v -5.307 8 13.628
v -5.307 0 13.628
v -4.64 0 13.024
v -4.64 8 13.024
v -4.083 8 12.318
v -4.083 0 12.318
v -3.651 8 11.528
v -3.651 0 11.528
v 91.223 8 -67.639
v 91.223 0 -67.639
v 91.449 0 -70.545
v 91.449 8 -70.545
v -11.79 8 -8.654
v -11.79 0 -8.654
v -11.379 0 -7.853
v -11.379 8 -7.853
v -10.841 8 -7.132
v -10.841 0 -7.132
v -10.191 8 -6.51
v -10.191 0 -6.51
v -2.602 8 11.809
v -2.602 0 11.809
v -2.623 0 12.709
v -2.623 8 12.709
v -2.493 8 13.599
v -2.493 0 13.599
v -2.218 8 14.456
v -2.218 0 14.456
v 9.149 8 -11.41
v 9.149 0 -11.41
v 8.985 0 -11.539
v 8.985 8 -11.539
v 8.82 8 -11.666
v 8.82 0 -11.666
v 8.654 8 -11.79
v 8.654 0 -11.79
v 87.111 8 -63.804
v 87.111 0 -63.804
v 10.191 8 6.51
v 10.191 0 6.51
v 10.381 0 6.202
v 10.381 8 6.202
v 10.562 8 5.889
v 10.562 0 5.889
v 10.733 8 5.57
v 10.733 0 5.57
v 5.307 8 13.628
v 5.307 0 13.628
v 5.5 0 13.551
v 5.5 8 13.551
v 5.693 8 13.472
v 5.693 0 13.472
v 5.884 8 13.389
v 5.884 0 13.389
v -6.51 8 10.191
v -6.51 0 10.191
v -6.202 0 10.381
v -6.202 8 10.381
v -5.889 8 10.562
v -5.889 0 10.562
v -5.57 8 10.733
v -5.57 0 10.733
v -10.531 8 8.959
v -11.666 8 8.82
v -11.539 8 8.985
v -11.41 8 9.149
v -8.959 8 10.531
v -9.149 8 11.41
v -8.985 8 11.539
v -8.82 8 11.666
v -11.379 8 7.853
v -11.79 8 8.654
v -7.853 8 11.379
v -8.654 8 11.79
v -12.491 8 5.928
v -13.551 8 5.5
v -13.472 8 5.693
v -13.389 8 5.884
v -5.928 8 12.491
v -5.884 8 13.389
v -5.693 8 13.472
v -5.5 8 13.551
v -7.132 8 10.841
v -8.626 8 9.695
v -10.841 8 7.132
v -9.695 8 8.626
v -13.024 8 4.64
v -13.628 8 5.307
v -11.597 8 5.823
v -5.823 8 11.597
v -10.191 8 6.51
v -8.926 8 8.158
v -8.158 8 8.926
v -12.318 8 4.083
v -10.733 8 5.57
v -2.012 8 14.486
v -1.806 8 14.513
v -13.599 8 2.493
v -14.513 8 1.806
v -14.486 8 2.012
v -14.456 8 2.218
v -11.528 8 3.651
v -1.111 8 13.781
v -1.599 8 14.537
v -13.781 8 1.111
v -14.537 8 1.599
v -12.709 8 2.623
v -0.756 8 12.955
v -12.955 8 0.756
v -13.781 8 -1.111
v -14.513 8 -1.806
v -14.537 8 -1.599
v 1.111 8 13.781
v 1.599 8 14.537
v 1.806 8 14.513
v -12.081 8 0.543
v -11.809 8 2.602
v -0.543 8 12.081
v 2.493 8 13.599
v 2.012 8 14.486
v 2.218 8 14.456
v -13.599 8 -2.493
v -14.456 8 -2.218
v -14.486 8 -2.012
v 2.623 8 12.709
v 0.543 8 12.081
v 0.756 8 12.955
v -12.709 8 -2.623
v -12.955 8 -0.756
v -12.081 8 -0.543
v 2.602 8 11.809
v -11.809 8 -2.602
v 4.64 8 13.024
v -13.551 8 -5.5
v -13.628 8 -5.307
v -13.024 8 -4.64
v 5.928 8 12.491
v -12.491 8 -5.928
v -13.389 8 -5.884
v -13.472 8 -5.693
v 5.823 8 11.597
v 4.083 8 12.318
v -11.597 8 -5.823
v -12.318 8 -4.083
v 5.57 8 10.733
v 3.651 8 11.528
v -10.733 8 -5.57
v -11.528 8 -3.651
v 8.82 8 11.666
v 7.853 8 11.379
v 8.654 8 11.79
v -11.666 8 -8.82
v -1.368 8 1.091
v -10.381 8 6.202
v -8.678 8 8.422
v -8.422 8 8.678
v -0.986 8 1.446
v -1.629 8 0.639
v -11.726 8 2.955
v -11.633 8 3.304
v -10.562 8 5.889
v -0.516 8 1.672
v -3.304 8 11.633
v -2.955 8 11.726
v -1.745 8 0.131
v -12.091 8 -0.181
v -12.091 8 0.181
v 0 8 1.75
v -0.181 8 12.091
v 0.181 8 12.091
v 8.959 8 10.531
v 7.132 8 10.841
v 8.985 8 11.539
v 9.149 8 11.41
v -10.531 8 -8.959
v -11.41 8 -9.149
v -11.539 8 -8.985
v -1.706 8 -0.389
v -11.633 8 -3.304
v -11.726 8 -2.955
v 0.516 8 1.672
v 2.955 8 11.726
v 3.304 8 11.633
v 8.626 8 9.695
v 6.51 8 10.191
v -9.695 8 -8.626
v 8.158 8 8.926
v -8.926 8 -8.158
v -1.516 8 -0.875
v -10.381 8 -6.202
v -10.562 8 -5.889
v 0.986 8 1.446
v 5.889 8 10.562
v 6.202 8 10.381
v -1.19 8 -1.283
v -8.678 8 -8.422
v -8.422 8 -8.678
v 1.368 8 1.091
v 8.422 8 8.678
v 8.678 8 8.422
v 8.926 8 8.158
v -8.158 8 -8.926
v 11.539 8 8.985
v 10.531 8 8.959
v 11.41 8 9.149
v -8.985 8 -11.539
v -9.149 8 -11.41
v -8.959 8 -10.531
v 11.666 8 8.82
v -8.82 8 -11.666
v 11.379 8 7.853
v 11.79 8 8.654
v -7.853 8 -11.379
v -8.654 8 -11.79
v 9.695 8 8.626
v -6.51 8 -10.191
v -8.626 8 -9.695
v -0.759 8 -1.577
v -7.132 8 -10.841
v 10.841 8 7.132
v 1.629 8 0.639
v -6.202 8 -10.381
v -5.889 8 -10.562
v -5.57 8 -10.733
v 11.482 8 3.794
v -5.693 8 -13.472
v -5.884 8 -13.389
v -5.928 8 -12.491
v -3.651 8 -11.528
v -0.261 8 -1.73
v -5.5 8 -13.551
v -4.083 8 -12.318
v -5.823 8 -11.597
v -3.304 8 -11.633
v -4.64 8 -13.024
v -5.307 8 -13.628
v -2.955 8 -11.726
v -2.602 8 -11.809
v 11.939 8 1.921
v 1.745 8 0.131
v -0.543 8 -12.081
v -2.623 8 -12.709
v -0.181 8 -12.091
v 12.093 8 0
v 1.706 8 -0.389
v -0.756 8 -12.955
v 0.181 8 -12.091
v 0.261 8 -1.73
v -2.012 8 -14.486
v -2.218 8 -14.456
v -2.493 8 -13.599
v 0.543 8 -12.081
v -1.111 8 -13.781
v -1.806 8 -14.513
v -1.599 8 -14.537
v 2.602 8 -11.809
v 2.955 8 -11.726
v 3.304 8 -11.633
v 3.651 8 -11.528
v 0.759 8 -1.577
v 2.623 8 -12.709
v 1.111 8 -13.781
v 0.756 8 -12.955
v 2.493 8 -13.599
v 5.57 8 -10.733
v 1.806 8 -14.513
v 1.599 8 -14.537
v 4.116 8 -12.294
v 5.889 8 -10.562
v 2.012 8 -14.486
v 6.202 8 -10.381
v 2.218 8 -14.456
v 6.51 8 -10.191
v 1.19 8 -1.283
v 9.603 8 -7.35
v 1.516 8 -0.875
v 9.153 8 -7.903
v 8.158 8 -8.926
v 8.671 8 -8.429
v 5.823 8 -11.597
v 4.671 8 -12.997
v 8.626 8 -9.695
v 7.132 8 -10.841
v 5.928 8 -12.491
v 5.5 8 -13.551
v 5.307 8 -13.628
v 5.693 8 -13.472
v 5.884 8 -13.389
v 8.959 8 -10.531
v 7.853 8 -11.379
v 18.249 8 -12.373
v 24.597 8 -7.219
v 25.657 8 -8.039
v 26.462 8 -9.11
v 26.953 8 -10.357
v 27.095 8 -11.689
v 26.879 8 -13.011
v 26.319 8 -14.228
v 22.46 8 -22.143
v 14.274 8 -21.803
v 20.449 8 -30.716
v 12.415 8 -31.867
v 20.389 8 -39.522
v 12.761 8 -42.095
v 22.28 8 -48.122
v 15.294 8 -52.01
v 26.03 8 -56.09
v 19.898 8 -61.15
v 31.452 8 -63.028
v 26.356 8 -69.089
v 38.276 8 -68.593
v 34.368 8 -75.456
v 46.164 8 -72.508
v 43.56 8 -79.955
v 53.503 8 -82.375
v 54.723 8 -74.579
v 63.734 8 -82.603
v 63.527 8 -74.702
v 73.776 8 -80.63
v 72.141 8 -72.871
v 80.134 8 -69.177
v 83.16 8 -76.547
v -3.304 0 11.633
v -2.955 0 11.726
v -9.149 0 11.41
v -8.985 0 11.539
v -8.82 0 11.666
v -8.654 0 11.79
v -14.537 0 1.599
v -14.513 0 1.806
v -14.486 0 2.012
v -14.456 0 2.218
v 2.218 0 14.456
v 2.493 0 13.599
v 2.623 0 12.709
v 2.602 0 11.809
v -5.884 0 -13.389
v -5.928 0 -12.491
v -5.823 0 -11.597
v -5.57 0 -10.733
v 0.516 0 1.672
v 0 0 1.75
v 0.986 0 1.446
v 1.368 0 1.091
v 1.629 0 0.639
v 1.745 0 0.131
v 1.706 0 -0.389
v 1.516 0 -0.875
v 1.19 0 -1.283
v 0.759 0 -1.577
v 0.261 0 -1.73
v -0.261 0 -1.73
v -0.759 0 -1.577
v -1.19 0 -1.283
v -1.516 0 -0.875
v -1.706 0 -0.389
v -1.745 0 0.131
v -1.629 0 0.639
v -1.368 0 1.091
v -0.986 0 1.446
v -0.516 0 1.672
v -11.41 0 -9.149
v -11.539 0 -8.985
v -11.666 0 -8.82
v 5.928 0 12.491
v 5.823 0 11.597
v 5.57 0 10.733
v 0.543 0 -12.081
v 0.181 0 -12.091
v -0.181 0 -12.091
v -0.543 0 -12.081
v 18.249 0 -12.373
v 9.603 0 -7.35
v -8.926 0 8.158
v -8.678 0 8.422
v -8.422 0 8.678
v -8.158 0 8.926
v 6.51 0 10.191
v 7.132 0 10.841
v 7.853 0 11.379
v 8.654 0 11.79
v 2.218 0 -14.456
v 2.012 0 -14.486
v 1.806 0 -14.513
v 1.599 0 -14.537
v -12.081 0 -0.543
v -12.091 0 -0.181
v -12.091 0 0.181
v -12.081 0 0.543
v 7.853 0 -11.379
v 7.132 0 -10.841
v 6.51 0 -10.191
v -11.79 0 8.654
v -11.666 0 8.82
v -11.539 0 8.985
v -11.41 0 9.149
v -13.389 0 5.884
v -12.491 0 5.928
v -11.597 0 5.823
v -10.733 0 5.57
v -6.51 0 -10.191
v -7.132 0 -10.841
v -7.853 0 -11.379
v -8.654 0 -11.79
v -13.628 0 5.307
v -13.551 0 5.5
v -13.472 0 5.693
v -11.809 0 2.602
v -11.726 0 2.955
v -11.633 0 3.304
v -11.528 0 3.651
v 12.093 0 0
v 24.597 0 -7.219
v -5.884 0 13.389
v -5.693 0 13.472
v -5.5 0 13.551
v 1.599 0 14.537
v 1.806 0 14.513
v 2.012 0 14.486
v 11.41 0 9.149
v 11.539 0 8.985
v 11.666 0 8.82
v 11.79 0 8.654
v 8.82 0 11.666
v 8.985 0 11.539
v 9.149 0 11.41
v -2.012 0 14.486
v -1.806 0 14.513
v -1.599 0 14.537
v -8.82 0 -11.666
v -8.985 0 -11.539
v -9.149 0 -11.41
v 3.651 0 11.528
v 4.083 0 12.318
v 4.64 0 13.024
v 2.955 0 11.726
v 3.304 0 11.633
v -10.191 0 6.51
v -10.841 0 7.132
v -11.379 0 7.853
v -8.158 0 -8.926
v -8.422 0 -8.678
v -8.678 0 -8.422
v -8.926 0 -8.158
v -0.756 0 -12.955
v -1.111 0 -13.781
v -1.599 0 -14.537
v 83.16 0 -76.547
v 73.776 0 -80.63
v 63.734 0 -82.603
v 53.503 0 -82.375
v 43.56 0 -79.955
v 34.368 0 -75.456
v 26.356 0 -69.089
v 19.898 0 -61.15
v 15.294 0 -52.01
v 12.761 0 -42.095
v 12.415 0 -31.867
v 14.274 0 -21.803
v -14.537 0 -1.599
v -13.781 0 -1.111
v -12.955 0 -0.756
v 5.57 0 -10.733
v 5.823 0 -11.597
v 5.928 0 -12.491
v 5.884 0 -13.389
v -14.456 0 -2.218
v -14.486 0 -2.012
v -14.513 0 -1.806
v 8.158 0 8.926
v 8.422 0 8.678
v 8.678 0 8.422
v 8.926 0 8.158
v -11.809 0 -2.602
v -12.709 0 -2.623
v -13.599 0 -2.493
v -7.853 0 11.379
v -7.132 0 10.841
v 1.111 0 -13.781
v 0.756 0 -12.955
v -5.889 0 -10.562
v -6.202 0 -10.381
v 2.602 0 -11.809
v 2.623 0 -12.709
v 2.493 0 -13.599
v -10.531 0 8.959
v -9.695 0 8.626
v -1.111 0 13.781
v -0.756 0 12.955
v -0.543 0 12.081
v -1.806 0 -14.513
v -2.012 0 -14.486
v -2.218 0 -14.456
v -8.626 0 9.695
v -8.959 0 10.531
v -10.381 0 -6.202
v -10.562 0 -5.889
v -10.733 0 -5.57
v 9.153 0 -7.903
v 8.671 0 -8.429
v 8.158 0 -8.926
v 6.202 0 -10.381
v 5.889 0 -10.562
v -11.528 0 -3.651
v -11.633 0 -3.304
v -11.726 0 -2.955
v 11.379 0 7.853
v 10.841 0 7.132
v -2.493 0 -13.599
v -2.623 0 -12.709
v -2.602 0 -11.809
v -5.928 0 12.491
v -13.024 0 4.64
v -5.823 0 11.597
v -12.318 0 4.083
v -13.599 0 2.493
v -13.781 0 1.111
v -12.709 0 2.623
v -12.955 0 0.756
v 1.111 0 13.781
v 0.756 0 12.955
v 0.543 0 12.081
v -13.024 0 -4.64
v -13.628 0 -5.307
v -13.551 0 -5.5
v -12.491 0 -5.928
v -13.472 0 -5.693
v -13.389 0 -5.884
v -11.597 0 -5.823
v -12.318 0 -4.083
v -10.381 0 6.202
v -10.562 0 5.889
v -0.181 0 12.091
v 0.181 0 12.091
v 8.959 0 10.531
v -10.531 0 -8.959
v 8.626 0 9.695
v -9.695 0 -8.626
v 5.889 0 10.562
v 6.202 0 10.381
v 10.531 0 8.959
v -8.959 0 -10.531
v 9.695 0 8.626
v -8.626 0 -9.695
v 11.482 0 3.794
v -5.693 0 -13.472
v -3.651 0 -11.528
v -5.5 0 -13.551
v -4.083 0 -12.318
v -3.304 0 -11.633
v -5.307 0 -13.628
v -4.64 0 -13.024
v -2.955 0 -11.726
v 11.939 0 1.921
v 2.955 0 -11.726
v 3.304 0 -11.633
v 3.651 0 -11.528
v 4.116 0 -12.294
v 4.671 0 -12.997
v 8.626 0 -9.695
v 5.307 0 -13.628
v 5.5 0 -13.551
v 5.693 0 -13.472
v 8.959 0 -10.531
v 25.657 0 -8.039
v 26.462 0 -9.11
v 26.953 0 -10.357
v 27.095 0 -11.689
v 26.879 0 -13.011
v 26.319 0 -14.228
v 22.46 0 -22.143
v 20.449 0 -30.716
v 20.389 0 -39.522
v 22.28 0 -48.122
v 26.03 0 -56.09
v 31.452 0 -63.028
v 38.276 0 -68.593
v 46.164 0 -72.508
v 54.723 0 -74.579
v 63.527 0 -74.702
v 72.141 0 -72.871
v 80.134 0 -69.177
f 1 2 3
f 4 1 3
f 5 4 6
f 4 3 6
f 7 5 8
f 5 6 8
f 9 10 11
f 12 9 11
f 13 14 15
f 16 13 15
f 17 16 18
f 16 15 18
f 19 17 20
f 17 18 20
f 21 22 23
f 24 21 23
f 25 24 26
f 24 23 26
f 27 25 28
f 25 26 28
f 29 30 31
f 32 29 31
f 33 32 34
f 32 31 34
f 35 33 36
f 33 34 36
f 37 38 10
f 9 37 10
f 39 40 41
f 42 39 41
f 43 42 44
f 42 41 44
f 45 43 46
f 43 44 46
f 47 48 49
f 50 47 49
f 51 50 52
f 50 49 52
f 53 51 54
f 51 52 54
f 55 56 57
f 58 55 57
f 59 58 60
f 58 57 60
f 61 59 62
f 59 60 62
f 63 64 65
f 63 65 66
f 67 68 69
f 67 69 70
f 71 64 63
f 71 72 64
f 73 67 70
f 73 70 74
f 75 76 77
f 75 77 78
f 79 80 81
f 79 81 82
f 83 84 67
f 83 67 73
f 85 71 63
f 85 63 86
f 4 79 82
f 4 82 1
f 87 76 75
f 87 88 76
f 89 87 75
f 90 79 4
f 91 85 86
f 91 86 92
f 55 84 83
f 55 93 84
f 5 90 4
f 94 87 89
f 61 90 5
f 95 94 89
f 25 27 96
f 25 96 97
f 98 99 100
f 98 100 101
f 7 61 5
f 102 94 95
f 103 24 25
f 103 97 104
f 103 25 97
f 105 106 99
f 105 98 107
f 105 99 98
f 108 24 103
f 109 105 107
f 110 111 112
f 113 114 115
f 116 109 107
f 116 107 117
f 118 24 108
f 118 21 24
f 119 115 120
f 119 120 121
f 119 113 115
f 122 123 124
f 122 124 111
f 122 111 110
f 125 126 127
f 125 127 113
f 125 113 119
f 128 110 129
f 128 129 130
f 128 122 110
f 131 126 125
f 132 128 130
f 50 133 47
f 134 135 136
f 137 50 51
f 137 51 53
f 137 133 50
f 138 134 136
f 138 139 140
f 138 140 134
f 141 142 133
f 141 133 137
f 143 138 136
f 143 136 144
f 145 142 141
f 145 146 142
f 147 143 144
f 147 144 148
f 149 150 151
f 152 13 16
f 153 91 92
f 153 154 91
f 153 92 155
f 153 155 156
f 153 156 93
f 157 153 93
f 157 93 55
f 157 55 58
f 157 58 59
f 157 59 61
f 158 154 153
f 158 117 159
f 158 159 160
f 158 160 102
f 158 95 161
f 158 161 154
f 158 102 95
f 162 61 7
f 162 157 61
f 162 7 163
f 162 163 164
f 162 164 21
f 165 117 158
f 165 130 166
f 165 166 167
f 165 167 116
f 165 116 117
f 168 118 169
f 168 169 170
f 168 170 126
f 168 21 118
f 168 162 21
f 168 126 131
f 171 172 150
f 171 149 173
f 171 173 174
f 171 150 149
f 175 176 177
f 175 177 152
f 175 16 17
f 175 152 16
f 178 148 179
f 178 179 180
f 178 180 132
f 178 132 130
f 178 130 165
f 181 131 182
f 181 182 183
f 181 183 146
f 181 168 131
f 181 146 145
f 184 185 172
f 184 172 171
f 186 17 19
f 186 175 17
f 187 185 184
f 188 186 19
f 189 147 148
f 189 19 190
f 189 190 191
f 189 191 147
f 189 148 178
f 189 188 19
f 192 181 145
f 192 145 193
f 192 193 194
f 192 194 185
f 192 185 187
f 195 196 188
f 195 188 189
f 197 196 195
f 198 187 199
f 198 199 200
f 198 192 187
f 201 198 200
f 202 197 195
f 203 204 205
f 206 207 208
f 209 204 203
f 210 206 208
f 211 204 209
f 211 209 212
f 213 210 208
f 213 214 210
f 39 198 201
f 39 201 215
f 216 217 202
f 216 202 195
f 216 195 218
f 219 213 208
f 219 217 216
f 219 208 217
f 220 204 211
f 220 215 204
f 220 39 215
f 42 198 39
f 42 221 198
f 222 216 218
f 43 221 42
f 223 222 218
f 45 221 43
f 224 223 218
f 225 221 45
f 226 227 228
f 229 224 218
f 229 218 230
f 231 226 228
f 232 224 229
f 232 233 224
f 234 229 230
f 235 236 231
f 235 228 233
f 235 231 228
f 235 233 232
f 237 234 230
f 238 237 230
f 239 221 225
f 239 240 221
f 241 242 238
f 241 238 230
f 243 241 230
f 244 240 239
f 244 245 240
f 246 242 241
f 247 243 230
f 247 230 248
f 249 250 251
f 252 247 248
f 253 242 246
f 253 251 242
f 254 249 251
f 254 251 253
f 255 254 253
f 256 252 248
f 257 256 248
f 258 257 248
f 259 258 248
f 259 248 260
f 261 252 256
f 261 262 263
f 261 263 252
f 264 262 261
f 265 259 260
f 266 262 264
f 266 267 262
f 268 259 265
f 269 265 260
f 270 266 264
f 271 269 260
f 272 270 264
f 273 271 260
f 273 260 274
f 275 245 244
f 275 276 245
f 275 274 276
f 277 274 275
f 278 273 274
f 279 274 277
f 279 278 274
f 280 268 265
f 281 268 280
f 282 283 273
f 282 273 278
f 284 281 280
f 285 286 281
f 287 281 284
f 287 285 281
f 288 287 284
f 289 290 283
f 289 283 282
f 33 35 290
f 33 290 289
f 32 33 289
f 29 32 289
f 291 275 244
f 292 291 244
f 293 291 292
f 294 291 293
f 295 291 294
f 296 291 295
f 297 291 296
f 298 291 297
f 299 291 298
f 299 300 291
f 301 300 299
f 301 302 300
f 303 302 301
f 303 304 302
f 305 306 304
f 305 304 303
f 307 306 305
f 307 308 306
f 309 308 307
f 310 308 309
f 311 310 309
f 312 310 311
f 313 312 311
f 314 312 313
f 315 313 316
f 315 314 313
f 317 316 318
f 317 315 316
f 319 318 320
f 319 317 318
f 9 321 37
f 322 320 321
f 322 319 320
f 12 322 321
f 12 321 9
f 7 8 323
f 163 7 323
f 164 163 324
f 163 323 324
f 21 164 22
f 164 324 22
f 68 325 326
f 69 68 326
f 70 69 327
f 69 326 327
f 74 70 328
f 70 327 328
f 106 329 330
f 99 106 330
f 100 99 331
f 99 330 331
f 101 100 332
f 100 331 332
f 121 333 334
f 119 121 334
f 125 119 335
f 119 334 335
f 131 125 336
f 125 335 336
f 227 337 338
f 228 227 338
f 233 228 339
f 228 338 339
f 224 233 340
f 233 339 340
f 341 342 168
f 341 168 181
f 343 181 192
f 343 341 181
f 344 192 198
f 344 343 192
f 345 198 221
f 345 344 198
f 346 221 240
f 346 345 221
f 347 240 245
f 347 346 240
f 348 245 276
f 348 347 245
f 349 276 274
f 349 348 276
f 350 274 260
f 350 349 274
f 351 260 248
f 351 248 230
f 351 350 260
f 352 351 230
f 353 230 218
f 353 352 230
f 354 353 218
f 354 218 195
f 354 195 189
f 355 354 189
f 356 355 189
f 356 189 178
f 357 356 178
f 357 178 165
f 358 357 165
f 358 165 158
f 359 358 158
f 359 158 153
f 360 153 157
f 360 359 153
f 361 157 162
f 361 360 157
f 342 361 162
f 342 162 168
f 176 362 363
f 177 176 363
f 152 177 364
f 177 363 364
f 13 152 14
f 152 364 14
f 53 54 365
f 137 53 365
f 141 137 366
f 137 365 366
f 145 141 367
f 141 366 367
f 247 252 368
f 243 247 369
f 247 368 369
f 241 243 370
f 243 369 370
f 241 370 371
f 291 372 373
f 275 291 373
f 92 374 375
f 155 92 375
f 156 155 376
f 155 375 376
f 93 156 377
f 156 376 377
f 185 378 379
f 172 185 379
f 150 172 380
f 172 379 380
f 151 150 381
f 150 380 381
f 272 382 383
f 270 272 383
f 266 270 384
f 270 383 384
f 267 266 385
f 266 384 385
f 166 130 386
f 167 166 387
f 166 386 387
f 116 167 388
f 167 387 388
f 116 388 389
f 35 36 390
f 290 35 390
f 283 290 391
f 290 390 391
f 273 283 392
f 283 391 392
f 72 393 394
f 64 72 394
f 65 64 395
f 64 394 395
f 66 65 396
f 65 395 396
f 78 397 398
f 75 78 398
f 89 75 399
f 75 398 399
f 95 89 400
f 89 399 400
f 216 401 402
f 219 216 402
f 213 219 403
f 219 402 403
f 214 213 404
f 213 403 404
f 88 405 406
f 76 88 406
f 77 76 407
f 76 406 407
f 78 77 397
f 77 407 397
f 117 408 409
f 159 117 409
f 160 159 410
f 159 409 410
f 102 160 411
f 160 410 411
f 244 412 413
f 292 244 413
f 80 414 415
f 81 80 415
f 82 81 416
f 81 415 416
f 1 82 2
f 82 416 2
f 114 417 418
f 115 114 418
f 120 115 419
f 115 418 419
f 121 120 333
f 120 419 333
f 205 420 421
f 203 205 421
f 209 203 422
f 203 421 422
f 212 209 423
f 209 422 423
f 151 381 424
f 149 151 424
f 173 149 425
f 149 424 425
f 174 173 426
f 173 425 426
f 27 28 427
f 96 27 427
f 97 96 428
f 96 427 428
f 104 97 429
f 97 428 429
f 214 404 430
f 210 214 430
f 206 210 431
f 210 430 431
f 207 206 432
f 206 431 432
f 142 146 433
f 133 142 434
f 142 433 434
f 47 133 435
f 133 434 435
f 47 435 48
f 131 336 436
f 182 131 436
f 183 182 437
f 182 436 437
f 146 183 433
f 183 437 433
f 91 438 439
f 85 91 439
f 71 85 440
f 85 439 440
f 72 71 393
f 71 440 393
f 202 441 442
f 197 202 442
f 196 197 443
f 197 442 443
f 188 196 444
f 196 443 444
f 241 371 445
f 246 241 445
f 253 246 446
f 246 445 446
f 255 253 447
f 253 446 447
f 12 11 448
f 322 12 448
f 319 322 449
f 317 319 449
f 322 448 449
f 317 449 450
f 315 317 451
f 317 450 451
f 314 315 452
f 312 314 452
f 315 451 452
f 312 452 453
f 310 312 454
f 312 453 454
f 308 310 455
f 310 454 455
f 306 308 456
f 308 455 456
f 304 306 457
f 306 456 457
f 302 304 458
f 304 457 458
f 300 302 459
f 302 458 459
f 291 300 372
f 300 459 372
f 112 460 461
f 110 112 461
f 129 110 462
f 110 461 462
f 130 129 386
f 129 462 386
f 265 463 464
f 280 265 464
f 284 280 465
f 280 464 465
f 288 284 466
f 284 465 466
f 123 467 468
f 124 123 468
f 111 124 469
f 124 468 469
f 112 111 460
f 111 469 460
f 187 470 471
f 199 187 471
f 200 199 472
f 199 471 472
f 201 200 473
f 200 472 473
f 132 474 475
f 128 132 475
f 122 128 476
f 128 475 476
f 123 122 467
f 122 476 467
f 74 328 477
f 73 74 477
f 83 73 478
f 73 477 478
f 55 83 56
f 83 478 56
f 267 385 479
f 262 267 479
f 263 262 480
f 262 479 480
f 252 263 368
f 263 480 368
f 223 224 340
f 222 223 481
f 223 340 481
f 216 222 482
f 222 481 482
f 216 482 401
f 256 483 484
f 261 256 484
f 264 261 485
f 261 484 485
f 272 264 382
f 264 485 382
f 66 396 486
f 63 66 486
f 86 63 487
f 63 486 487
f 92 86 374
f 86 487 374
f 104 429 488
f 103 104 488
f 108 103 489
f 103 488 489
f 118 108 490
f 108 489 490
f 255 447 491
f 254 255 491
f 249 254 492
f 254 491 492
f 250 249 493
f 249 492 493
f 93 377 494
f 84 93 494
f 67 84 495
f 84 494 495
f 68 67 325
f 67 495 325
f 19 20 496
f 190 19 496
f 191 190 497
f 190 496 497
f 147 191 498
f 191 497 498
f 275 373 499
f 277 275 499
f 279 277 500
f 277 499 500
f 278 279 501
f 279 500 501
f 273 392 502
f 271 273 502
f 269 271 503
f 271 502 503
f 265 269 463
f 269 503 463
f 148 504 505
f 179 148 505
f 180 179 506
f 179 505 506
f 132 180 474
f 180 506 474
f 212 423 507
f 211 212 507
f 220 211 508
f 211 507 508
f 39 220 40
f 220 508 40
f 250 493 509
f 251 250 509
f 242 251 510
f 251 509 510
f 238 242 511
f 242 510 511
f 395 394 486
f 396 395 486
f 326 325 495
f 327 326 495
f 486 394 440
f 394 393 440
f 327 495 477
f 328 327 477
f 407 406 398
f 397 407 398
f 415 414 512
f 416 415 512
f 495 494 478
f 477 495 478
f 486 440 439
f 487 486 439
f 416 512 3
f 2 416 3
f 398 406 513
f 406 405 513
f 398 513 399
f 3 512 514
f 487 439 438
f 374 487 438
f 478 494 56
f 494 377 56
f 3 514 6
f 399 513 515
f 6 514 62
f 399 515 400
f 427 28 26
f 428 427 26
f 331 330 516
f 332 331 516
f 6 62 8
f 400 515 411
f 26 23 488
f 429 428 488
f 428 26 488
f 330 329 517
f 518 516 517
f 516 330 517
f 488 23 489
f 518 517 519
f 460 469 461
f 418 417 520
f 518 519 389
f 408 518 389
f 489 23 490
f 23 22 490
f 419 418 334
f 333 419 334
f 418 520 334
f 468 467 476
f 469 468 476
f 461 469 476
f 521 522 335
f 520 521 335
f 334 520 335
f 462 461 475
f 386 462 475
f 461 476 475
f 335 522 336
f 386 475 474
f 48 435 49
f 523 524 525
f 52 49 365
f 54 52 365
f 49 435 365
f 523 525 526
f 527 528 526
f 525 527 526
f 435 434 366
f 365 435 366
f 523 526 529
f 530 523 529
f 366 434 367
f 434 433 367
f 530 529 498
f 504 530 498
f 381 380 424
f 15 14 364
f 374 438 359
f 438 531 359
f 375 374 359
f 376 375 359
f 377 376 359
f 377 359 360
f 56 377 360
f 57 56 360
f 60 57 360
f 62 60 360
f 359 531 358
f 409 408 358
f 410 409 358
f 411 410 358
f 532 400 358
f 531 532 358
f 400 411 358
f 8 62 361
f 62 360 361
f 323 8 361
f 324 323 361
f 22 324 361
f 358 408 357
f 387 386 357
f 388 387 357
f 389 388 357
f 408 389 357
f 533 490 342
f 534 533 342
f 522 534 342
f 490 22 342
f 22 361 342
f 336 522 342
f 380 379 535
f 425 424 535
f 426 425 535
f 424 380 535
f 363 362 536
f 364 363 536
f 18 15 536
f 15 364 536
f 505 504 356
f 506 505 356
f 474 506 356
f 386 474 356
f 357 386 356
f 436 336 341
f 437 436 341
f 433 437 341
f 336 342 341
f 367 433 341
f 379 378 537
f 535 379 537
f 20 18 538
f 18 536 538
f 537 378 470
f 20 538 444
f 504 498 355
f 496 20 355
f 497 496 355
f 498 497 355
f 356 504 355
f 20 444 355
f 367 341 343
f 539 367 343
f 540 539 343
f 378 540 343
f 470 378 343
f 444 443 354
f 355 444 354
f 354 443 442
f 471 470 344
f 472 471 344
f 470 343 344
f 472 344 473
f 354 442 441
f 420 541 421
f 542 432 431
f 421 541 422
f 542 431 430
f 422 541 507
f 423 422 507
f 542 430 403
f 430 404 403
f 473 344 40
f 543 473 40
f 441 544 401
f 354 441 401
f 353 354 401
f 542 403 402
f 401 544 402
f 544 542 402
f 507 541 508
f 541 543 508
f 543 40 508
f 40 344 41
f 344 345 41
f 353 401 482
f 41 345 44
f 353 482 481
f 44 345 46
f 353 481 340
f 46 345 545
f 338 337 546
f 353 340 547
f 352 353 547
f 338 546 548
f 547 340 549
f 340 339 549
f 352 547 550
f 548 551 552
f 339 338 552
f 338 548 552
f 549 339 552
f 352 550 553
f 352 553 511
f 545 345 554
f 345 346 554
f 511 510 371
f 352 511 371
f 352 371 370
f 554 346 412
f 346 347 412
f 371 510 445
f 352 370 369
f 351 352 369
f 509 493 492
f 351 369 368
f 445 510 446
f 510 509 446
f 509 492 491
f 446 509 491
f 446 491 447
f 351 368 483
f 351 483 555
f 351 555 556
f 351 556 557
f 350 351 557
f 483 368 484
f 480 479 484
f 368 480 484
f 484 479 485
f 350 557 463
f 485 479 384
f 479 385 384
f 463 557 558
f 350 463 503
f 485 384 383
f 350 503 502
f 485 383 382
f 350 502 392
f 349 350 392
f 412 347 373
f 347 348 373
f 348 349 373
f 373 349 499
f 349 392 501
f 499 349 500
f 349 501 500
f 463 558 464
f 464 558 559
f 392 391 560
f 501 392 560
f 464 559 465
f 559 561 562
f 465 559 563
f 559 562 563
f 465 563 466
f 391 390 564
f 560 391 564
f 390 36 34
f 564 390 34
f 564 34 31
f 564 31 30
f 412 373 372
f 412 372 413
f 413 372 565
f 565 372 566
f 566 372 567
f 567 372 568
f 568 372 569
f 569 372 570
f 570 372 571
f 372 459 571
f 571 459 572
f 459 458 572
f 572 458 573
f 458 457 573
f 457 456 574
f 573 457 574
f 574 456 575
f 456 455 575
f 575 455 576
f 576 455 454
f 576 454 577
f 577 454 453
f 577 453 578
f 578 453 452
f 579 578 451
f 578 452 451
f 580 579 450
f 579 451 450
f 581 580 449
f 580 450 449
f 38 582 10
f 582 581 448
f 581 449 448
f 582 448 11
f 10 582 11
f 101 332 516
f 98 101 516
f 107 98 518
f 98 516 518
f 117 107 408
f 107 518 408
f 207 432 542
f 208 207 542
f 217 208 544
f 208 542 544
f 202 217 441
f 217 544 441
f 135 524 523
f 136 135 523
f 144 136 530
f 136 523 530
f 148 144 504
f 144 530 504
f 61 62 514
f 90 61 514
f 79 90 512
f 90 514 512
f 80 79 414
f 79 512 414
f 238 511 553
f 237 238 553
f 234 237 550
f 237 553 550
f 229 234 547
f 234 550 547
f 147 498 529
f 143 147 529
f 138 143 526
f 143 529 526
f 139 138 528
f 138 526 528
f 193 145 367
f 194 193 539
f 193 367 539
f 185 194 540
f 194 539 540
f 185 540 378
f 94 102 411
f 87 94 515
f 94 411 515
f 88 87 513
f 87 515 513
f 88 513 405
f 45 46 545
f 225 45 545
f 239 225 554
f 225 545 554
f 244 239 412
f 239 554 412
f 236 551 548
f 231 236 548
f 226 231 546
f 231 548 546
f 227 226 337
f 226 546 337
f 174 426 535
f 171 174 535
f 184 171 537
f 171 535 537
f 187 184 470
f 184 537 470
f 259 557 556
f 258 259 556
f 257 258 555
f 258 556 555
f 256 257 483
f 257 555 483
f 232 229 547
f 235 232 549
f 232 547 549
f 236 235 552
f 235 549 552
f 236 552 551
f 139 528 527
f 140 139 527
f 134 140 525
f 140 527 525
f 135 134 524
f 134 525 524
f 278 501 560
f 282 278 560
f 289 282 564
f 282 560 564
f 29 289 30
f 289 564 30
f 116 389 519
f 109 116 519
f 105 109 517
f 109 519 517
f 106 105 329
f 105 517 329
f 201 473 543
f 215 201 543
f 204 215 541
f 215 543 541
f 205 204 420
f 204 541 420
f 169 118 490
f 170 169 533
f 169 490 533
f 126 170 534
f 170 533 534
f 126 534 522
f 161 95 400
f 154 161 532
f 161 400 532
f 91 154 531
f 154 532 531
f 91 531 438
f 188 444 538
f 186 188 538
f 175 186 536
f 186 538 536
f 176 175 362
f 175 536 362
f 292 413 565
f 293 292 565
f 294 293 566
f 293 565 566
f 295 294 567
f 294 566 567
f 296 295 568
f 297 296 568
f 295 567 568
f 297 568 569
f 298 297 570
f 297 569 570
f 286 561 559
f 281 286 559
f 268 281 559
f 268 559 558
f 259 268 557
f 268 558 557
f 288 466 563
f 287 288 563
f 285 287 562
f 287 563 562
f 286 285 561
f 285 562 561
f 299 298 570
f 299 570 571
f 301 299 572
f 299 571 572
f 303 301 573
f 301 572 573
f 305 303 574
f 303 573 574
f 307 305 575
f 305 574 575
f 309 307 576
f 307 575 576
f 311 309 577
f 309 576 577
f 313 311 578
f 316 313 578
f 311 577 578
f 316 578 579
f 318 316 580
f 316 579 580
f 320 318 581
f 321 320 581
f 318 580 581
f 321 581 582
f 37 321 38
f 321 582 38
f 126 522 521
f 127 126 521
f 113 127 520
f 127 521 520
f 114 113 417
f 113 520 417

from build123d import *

# Parameters (mm, degrees)
CROQUIS1_R              = 1.75
SALIENTE_EXTRUIR1_DEPTH = 8


with BuildPart() as part:
    # Croquis1 → Saliente-Extruir1 (new body)
    with BuildSketch(Plane(origin=(0, 0, 0), x_dir=(1, 0, 0), z_dir=(0, 1, 0))):
        with BuildLine():
            ThreePointArc((26.318983455, 14.228225469), (34.708358258, 66.001642936), (87.111019212, 63.804032696))
            Line((87.111019212, 63.804032696), (91.223264764, 67.638763711))
            Line((91.223264764, 67.638763711), (91.448573923, 70.544764206))
            ThreePointArc((91.448573923, 70.544764206), (30.189185372, 72.489467715), (18.249404228, 12.373445028))
            Line((18.249404228, 12.373445028), (9.60277667, 7.349917196))
            ThreePointArc((9.60277667, 7.349917196), (8.915528014, 8.169942644), (8.158486898, 8.926012217))
            ThreePointArc((8.158486898, 8.926012217), (8.809805691, 10.105820521), (9.148703928, 11.410163953))
            ThreePointArc((9.148703928, 11.410163953), (8.903135899, 11.602792602), (8.65351323, 11.79013714))
            ThreePointArc((8.65351323, 11.79013714), (7.48132754, 11.125197659), (6.510293938, 10.190715157))
            ThreePointArc((6.510293938, 10.190715157), (6.046375, 10.472628702), (5.57027124, 10.733437515))
            ThreePointArc((5.57027124, 10.733437515), (5.894040025, 12.041618533), (5.883801663, 13.389230859))
            ThreePointArc((5.883801663, 13.389230859), (5.596745198, 13.511738163), (5.30713988, 13.62809199))
            ThreePointArc((5.30713988, 13.62809199), (4.382711316, 12.654251603), (3.650909885, 11.528463019))
            ThreePointArc((3.650909885, 11.528463019), (3.129834008, 11.680699536), (2.602450802, 11.809396783))
            ThreePointArc((2.602450802, 11.809396783), (2.576605271, 13.156800143), (2.217928037, 14.455843809))
            ThreePointArc((2.217928037, 14.455843809), (1.908945561, 14.499881098), (1.599093719, 14.537314892))
            ThreePointArc((1.599093719, 14.537314892), (0.916420874, 13.375367565), (0.542722358, 12.080565177))
            ThreePointArc((0.542722358, 12.080565177), (0, 12.09275), (-0.542722358, 12.080565177))
            ThreePointArc((-0.542722358, 12.080565177), (-0.916420874, 13.375367565), (-1.599093719, 14.537314892))
            ThreePointArc((-1.599093719, 14.537314892), (-1.908945561, 14.499881098), (-2.217928037, 14.455843809))
            ThreePointArc((-2.217928037, 14.455843809), (-2.576605271, 13.156800143), (-2.602450802, 11.809396783))
            ThreePointArc((-2.602450802, 11.809396783), (-3.129834008, 11.680699536), (-3.650909885, 11.528463019))
            ThreePointArc((-3.650909885, 11.528463019), (-4.346994451, 12.682425791), (-5.30713988, 13.62809199))
            ThreePointArc((-5.30713988, 13.62809199), (-5.596745198, 13.511738163), (-5.883801663, 13.389230859))
            ThreePointArc((-5.883801663, 13.389230859), (-5.894040025, 12.041618533), (-5.57027124, 10.733437515))
            ThreePointArc((-5.57027124, 10.733437515), (-6.046375, 10.472628702), (-6.510293938, 10.190715157))
            ThreePointArc((-6.510293938, 10.190715157), (-7.48132754, 11.125197659), (-8.65351323, 11.79013714))
            ThreePointArc((-8.65351323, 11.79013714), (-8.903135899, 11.602792602), (-9.148703928, 11.410163953))
            ThreePointArc((-9.148703928, 11.410163953), (-8.809805691, 10.105820521), (-8.158486898, 8.926012217))
            ThreePointArc((-8.158486898, 8.926012217), (-8.550865528, 8.550865528), (-8.926012217, 8.158486898))
            ThreePointArc((-8.926012217, 8.158486898), (-10.105820521, 8.809805691), (-11.410163953, 9.148703928))
            ThreePointArc((-11.410163953, 9.148703928), (-11.602792602, 8.903135899), (-11.79013714, 8.65351323))
            ThreePointArc((-11.79013714, 8.65351323), (-11.125197659, 7.48132754), (-10.190715157, 6.510293938))
            ThreePointArc((-10.190715157, 6.510293938), (-10.472628702, 6.046375), (-10.733437515, 5.57027124))
            ThreePointArc((-10.733437515, 5.57027124), (-12.041618533, 5.894040025), (-13.389230859, 5.883801663))
            ThreePointArc((-13.389230859, 5.883801663), (-13.511738163, 5.596745198), (-13.62809199, 5.30713988))
            ThreePointArc((-13.62809199, 5.30713988), (-12.682425791, 4.346994451), (-11.528463019, 3.650909885))
            ThreePointArc((-11.528463019, 3.650909885), (-11.680699536, 3.129834008), (-11.809396783, 2.602450802))
            ThreePointArc((-11.809396783, 2.602450802), (-13.156800143, 2.576605271), (-14.455843809, 2.217928037))
            ThreePointArc((-14.455843809, 2.217928037), (-14.499881098, 1.908945561), (-14.537314892, 1.599093719))
            ThreePointArc((-14.537314892, 1.599093719), (-13.375367565, 0.916420874), (-12.080565177, 0.542722358))
            ThreePointArc((-12.080565177, 0.542722358), (-12.09275, 0), (-12.080565177, -0.542722358))
            ThreePointArc((-12.080565177, -0.542722358), (-13.375367565, -0.916420874), (-14.537314892, -1.599093719))
            ThreePointArc((-14.537314892, -1.599093719), (-14.499881098, -1.908945561), (-14.455843809, -2.217928037))
            ThreePointArc((-14.455843809, -2.217928037), (-13.156800143, -2.576605271), (-11.809396783, -2.602450802))
            ThreePointArc((-11.809396783, -2.602450802), (-11.680699536, -3.129834008), (-11.528463019, -3.650909885))
            ThreePointArc((-11.528463019, -3.650909885), (-12.682425791, -4.346994451), (-13.62809199, -5.30713988))
            ThreePointArc((-13.62809199, -5.30713988), (-13.511738163, -5.596745198), (-13.389230859, -5.883801663))
            ThreePointArc((-13.389230859, -5.883801663), (-12.041618533, -5.894040025), (-10.733437515, -5.57027124))
            ThreePointArc((-10.733437515, -5.57027124), (-10.472628702, -6.046375), (-10.190715157, -6.510293938))
            ThreePointArc((-10.190715157, -6.510293938), (-11.125197659, -7.48132754), (-11.79013714, -8.65351323))
            ThreePointArc((-11.79013714, -8.65351323), (-11.602792602, -8.903135899), (-11.410163953, -9.148703928))
            ThreePointArc((-11.410163953, -9.148703928), (-10.105820521, -8.809805691), (-8.926012217, -8.158486898))
            ThreePointArc((-8.926012217, -8.158486898), (-8.550865528, -8.550865528), (-8.158486898, -8.926012217))
            ThreePointArc((-8.158486898, -8.926012217), (-8.809805691, -10.105820521), (-9.148703928, -11.410163953))
            ThreePointArc((-9.148703928, -11.410163953), (-8.903135899, -11.602792602), (-8.65351323, -11.79013714))
            ThreePointArc((-8.65351323, -11.79013714), (-7.48132754, -11.125197659), (-6.510293938, -10.190715157))
            ThreePointArc((-6.510293938, -10.190715157), (-6.046375, -10.472628702), (-5.57027124, -10.733437515))
            ThreePointArc((-5.57027124, -10.733437515), (-5.894040025, -12.041618533), (-5.883801663, -13.389230859))
            ThreePointArc((-5.883801663, -13.389230859), (-5.596745198, -13.511738163), (-5.30713988, -13.62809199))
            ThreePointArc((-5.30713988, -13.62809199), (-4.346994451, -12.682425791), (-3.650909885, -11.528463019))
            ThreePointArc((-3.650909885, -11.528463019), (-3.129834008, -11.680699536), (-2.602450802, -11.809396783))
            ThreePointArc((-2.602450802, -11.809396783), (-2.576605271, -13.156800143), (-2.217928037, -14.455843809))
            ThreePointArc((-2.217928037, -14.455843809), (-1.908945561, -14.499881098), (-1.599093719, -14.537314892))
            ThreePointArc((-1.599093719, -14.537314892), (-0.916420874, -13.375367565), (-0.542722358, -12.080565177))
            ThreePointArc((-0.542722358, -12.080565177), (0, -12.09275), (0.542722358, -12.080565177))
            ThreePointArc((0.542722358, -12.080565177), (0.916420874, -13.375367565), (1.599093719, -14.537314892))
            ThreePointArc((1.599093719, -14.537314892), (1.908945561, -14.499881098), (2.217928037, -14.455843809))
            ThreePointArc((2.217928037, -14.455843809), (2.576605271, -13.156800143), (2.602450802, -11.809396783))
            ThreePointArc((2.602450802, -11.809396783), (3.129834008, -11.680699536), (3.650909885, -11.528463019))
            ThreePointArc((3.650909885, -11.528463019), (4.346994451, -12.682425791), (5.30713988, -13.62809199))
            ThreePointArc((5.30713988, -13.62809199), (5.596745198, -13.511738163), (5.883801663, -13.389230859))
            ThreePointArc((5.883801663, -13.389230859), (5.894040025, -12.041618533), (5.57027124, -10.733437515))
            ThreePointArc((5.57027124, -10.733437515), (6.046375, -10.472628702), (6.510293938, -10.190715157))
            ThreePointArc((6.510293938, -10.190715157), (7.48132754, -11.125197659), (8.65351323, -11.79013714))
            ThreePointArc((8.65351323, -11.79013714), (8.903135899, -11.602792602), (9.148703928, -11.410163953))
            ThreePointArc((9.148703928, -11.410163953), (8.809805691, -10.105820521), (8.158486898, -8.926012217))
            ThreePointArc((8.158486898, -8.926012217), (8.550865528, -8.550865528), (8.926012217, -8.158486898))
            ThreePointArc((8.926012217, -8.158486898), (10.105820521, -8.809805691), (11.410163953, -9.148703928))
            ThreePointArc((11.410163953, -9.148703928), (11.602792602, -8.903135899), (11.79013714, -8.65351323))
            ThreePointArc((11.79013714, -8.65351323), (11.125197659, -7.48132754), (10.190715157, -6.510293938))
            ThreePointArc((10.190715157, -6.510293938), (10.472628702, -6.046375), (10.733437515, -5.57027124))
            ThreePointArc((10.733437515, -5.57027124), (11.748007896, -2.866864669), (12.09275, 0))
            Line((12.09275, 0), (24.597080908, 7.219378816))
            ThreePointArc((24.597080908, 7.219378816), (26.952693775, 10.356600271), (26.318983455, 14.228225469))
        make_face()
        with Locations(Location((0, 0, 0), (0, 0, 270))):
            Circle(CROQUIS1_R, mode=Mode.SUBTRACT)
    extrude(amount=SALIENTE_EXTRUIR1_DEPTH)


solid = part.part
